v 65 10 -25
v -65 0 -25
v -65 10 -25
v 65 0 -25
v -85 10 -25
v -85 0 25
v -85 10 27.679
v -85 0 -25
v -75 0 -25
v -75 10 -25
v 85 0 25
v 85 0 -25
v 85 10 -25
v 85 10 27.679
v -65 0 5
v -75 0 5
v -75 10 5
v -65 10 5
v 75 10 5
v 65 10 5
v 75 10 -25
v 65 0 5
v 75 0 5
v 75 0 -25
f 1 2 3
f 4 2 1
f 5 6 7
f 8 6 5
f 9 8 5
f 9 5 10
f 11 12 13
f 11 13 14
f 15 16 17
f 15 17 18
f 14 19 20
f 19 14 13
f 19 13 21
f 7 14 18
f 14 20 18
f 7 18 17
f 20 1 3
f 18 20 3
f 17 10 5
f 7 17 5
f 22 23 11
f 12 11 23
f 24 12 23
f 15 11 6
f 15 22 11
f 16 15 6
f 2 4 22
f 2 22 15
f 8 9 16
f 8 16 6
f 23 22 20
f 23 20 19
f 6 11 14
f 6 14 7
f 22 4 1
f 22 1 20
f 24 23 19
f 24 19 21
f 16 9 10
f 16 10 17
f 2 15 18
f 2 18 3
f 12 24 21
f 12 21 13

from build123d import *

# Parameters (mm, degrees)
BOSS_EXTRUDE1_DEPTH = 10
DRAFT2_ANGLE        = 15


with BuildPart() as part:
    # Sketch1 → Boss-Extrude1 (new body)
    with BuildSketch(Plane(origin=(0, 0, 0), x_dir=(1, 0, 0), z_dir=(0, 1, 0))):
        Polygon((-75, 25), (-75, -5), (-65, -5), (-65, 25), (65, 25), (65, -5), (75, -5), (75, 25), (85, 25), (85, -25), (-85, -25), (-85, 25), align=None)
    extrude(amount=BOSS_EXTRUDE1_DEPTH)

    # Draft2
    draft2_faces = [part.faces().sort_by_distance(p)[0] for p in [
        (0, 5, 25),
    ]]
    draft(draft2_faces, Plane(origin=(0, 0, 0), x_dir=(0, 0, -1), z_dir=(0, -1, 0)), DRAFT2_ANGLE)


solid = part.part
